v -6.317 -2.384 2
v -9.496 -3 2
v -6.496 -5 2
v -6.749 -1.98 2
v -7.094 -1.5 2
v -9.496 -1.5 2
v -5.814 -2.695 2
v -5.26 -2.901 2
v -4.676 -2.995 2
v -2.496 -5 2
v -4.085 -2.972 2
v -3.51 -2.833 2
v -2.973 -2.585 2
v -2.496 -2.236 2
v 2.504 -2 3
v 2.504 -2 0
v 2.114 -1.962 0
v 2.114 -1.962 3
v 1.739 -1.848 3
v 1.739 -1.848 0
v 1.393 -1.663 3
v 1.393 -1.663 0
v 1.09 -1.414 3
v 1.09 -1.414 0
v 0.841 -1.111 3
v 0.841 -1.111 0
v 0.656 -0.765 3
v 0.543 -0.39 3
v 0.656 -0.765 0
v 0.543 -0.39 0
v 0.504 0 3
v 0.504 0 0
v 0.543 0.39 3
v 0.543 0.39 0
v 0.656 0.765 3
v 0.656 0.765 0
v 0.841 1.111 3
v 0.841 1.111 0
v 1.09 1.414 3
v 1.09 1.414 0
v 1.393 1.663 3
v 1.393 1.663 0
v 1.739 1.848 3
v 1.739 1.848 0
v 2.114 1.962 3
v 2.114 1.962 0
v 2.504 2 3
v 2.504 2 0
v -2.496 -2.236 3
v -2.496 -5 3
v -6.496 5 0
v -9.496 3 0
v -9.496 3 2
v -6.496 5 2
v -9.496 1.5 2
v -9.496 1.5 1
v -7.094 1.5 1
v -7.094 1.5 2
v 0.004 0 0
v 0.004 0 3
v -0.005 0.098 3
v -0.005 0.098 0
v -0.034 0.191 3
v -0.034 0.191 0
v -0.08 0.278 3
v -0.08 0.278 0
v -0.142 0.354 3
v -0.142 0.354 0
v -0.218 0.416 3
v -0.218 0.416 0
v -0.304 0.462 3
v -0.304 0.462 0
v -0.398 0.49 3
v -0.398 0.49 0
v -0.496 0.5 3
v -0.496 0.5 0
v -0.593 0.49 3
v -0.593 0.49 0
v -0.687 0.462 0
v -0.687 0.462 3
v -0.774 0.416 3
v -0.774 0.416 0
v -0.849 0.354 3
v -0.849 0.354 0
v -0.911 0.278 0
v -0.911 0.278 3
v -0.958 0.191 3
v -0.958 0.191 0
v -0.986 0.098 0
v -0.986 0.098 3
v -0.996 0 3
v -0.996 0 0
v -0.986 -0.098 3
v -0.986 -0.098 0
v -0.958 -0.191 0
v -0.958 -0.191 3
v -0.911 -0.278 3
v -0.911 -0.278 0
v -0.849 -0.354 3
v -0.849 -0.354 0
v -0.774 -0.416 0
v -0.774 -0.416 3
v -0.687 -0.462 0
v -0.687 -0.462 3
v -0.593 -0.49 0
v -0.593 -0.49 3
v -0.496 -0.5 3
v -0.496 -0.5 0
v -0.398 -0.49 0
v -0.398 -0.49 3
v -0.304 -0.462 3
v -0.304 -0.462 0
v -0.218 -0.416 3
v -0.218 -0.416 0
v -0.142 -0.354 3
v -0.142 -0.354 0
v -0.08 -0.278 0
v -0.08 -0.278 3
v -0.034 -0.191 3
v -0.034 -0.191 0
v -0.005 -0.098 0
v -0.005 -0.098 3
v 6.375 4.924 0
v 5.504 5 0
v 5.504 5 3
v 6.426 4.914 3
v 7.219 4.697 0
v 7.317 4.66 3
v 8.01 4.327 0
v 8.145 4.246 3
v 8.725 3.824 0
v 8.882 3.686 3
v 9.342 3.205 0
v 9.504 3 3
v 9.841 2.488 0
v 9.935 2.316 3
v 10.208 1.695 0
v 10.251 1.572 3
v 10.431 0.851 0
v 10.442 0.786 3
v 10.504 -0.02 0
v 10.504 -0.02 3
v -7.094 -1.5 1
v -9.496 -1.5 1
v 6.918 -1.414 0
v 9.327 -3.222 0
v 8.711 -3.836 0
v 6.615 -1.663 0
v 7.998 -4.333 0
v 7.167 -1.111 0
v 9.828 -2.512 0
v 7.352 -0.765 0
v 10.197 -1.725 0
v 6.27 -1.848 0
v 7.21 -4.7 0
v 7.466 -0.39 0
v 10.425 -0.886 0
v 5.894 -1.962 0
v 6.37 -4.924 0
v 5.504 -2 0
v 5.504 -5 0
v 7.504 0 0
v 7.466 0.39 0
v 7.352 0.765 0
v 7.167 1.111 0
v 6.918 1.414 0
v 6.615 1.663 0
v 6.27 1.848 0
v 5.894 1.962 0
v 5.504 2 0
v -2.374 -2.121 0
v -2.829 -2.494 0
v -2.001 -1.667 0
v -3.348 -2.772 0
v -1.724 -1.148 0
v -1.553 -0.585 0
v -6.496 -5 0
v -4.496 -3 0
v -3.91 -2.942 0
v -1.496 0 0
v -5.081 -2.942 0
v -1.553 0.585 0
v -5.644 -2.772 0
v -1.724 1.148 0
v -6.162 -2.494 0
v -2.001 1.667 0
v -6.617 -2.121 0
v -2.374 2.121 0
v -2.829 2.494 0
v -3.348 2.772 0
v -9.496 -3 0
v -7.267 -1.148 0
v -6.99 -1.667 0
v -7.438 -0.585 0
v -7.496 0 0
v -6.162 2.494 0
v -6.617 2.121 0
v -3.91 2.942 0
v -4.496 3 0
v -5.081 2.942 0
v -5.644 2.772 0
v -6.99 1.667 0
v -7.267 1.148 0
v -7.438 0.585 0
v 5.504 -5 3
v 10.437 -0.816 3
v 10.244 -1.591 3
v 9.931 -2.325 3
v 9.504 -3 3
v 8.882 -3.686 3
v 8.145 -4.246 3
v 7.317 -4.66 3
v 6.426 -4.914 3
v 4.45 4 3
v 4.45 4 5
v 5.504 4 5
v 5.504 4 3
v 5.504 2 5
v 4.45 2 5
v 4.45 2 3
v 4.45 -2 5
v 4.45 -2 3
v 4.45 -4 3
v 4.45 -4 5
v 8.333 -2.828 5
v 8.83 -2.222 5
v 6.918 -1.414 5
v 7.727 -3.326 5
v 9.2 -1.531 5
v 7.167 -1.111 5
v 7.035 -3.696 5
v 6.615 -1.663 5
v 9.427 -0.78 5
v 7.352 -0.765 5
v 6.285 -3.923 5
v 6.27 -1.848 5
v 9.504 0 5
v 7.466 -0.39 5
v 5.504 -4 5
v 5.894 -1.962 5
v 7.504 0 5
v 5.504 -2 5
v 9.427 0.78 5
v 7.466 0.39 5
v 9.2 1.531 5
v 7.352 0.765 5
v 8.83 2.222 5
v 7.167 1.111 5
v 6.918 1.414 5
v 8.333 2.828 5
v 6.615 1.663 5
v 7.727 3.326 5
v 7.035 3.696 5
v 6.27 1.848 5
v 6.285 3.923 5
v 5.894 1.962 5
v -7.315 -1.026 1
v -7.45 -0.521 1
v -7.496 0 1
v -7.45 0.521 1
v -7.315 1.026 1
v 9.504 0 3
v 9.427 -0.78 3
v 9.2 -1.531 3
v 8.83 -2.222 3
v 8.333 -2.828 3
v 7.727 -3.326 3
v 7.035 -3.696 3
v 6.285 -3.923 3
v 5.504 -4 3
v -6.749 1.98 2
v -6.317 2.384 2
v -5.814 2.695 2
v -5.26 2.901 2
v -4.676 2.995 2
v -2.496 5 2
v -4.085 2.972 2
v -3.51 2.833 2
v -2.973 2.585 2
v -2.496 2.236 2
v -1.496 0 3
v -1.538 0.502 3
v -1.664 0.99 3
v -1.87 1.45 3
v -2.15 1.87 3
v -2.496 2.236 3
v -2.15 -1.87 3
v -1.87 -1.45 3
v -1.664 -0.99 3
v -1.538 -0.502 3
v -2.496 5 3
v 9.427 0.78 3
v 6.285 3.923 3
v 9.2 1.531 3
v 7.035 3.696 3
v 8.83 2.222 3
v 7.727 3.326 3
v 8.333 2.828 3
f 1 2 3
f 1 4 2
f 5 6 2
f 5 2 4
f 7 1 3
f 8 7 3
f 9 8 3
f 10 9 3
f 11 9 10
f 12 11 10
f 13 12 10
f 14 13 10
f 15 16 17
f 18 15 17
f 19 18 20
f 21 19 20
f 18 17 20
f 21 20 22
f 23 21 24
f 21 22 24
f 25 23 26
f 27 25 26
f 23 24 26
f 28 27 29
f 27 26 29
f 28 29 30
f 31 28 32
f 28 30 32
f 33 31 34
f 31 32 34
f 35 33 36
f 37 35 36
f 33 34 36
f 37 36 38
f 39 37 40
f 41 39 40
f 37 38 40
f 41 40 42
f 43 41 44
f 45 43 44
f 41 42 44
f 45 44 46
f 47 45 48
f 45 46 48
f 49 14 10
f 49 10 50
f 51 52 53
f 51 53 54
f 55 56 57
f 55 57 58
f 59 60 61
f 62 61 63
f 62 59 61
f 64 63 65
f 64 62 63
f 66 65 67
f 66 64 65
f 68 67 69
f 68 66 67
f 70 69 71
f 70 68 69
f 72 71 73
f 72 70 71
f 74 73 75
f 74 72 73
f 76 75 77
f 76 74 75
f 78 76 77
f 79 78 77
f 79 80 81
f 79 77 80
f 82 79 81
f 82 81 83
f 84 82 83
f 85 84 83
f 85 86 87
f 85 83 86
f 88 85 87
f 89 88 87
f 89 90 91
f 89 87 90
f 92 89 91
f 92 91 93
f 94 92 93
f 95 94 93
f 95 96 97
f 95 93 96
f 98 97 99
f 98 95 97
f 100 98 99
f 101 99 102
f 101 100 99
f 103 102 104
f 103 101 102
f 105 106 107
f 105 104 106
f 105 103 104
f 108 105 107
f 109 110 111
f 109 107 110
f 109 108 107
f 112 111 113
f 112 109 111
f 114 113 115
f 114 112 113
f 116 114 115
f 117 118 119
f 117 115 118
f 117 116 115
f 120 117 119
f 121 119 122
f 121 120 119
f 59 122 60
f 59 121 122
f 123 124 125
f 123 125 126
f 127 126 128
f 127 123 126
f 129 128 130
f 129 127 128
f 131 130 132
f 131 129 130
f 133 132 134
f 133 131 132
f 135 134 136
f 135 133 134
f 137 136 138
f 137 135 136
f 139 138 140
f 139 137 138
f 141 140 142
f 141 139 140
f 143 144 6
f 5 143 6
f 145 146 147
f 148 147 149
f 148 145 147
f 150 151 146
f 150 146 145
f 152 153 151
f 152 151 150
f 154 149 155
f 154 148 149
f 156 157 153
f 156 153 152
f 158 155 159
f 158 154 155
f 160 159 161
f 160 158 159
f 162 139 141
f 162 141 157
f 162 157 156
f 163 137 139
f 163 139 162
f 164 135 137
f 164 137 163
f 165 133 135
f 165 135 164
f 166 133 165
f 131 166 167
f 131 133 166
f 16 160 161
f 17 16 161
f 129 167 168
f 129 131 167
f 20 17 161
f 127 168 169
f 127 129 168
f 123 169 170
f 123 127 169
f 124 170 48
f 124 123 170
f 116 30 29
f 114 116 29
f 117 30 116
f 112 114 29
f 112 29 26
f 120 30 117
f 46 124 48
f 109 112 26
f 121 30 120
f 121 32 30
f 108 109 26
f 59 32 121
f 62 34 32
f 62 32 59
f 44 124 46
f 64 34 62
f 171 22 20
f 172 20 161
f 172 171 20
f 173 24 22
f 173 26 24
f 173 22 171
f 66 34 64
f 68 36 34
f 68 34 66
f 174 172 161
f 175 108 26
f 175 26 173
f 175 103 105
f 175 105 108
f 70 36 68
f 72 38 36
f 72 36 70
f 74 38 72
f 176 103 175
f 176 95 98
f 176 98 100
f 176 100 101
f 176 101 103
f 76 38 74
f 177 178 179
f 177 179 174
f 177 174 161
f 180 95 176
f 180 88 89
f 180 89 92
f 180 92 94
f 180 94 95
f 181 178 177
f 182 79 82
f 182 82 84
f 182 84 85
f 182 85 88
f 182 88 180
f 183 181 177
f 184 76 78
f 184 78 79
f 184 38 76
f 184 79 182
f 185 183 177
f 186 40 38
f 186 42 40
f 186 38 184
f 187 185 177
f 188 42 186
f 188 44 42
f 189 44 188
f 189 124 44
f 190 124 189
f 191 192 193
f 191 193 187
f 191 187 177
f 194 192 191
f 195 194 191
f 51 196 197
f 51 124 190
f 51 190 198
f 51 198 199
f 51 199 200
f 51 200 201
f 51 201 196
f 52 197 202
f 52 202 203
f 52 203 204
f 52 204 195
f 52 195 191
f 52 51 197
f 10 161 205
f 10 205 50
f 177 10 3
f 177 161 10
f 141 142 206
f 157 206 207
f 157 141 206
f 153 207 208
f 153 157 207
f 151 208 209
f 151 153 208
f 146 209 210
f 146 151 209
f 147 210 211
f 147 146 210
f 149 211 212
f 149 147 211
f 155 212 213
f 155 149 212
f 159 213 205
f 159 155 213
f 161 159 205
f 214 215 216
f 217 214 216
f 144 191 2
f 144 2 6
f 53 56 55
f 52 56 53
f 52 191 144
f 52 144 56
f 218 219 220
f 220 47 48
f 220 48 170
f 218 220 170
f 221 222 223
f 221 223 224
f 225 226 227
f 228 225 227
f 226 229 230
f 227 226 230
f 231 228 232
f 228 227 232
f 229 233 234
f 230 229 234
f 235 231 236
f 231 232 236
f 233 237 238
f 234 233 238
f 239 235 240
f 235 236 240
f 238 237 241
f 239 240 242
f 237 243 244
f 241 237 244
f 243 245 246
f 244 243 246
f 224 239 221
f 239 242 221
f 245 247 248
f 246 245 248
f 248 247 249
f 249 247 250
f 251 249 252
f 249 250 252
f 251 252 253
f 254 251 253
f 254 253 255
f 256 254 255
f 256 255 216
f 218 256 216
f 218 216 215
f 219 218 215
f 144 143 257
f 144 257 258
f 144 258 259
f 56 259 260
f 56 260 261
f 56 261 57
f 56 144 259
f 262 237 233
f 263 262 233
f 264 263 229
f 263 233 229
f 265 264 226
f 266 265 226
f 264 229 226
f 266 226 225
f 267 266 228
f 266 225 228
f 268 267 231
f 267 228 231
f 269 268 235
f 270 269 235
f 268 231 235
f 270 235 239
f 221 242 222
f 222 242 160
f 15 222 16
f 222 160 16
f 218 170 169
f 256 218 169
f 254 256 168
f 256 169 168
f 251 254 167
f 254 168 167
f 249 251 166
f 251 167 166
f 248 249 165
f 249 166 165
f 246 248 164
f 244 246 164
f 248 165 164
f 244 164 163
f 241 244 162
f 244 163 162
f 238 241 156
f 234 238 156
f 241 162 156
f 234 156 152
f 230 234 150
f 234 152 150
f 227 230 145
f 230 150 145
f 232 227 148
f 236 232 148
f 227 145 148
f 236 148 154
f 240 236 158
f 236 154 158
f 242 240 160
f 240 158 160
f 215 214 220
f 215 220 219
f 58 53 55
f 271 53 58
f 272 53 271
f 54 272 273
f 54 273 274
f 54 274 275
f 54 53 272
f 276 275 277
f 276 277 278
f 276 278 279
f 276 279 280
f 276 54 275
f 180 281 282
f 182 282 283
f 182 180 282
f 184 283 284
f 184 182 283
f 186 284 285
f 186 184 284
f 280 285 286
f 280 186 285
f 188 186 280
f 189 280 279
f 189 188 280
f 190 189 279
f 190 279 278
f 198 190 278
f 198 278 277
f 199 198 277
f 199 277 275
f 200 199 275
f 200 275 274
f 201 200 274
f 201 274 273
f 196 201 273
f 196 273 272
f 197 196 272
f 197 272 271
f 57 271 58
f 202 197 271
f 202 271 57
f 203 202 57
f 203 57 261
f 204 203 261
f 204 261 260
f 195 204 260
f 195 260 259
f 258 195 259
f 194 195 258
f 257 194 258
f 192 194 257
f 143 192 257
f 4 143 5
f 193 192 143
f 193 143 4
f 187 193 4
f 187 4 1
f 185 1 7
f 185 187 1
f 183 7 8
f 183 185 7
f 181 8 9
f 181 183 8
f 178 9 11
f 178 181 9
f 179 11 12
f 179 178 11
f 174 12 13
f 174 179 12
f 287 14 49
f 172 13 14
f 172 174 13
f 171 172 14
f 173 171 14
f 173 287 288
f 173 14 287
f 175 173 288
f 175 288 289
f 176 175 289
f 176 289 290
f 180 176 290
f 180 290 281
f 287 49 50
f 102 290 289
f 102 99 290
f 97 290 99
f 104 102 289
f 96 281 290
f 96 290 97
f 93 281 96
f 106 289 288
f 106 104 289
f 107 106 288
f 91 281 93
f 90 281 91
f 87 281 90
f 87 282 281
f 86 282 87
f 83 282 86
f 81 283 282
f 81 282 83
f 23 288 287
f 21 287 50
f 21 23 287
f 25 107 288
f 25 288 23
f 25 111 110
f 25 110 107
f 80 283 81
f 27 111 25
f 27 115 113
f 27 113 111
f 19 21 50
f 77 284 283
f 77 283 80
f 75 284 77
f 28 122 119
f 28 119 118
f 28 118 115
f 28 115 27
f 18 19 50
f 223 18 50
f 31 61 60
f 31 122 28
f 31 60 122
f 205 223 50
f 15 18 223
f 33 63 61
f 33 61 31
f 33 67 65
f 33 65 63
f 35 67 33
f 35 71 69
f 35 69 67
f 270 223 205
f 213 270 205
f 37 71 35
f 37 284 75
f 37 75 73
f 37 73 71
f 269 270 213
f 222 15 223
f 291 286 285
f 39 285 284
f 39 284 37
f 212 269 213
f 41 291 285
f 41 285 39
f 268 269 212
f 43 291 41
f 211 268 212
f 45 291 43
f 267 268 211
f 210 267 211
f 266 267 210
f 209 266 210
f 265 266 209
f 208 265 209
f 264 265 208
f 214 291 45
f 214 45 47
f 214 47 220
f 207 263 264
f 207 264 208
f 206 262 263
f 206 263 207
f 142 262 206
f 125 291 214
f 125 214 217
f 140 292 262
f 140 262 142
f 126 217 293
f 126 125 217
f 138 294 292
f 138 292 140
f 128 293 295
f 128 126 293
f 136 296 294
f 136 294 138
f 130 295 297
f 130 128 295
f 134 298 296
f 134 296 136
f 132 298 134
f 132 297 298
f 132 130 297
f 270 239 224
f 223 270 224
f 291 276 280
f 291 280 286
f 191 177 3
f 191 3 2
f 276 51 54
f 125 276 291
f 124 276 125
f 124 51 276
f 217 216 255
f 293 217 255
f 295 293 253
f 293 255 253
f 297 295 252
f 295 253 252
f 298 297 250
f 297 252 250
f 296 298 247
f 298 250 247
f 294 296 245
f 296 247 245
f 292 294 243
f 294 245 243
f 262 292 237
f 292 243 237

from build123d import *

# Parameters (mm, degrees)
SKETCH1_R           = 3
SKETCH1_R_2         = 0.5
BOSS_EXTRUDE1_DEPTH = 5
CUT_EXTRUDE1_DEPTH  = 25
CUT_EXTRUDE2_DEPTH  = 2
SKETCH4_W           = 1
SKETCH4_H           = 3
CUT_EXTRUDE3_DEPTH  = 3


with BuildPart() as part:
    # Sketch1 → Boss-Extrude1 (new body)
    with BuildSketch(Plane.XY):
        with BuildLine():
            Line((-9.495764101, 3), (-6.495764101, 5))
            Line((-6.495764101, 5), (5.504235899, 5))
            ThreePointArc((5.504235899, 5), (9.046847958, 3.528441554), (10.504195739, -0.02004008))
            ThreePointArc((10.504195739, -0.02004008), (9.032677453, -3.542612059), (5.504235899, -5))
            Line((5.504235899, -5), (-6.495764101, -5))
            Line((-6.495764101, -5), (-9.495764101, -3))
            Line((-9.495764101, -3), (-9.495764101, 3))
        make_face()
        with Locations((-4.495764101, 0)):
            Circle(SKETCH1_R, mode=Mode.SUBTRACT)
        with Locations((-0.495764101, 0)):
            Circle(SKETCH1_R_2, mode=Mode.SUBTRACT)
        with BuildLine():
            Line((2.504235899, 2), (5.504235899, 2))
            ThreePointArc((5.504235899, 2), (7.504235899, 0), (5.504235899, -2))
            Line((5.504235899, -2), (2.504235899, -2))
            ThreePointArc((2.504235899, -2), (0.504235899, 0), (2.504235899, 2))
        make_face(mode=Mode.SUBTRACT)
    extrude(amount=BOSS_EXTRUDE1_DEPTH)

    # Sketch2 → Cut-Extrude1 (cut)
    with BuildSketch(Plane(origin=(0, 5, 0), x_dir=(1, 0, 0), z_dir=(0, 1, 0))):
        Polygon((-9.495764101, -2), (-2.495764101, -2), (-2.495764101, -3), (4.450061274, -3), (4.450061274, -5), (9.504235899, -5), (9.504235899, -3), (10.504235899, -3), (10.504235899, -6.643116644), (-9.495764101, -6.643116644), align=None)
    extrude(amount=-CUT_EXTRUDE1_DEPTH, mode=Mode.SUBTRACT)

    # Sketch3 → Cut-Extrude2 (cut)
    with BuildSketch(Plane.XY.offset(5)):
        with BuildLine():
            Line((4.450061274, 5), (4.450061274, 4))
            Line((4.450061274, 4), (5.504235899, 4))
            ThreePointArc((5.504235899, 4), (8.332663024, 2.828427125), (9.504235899, 0))
            Line((9.504235899, 0), (9.504235899, 3))
            ThreePointArc((9.504235899, 3), (7.740303877, 4.472135955), (5.504235899, 5))
            Line((5.504235899, 5), (4.450061274, 5))
        make_face()
        with BuildLine():
            Line((5.504235899, -4), (4.450061274, -4))
            Line((4.450061274, -4), (4.450061274, -5))
            Line((4.450061274, -5), (5.504235899, -5))
            ThreePointArc((5.504235899, -5), (7.740303877, -4.472135955), (9.504235899, -3))
            Line((9.504235899, -3), (9.504235899, 0))
            ThreePointArc((9.504235899, 0), (8.332663024, -2.828427125), (5.504235899, -4))
        make_face()
        with BuildLine():
            Line((4.450061274, -4), (4.450061274, -2))
            Line((4.450061274, -2), (2.504235899, -2))
            ThreePointArc((2.504235899, -2), (0.504235899, 0), (2.504235899, 2))
            Line((2.504235899, 2), (4.450061274, 2))
            Line((4.450061274, 2), (4.450061274, 4))
            Line((4.450061274, 4), (4.429293772, 4))
            Line((4.429293772, 4), (2.504235899, 4))
            ThreePointArc((2.504235899, 4), (-1.495764101, 0), (2.504235899, -4))
            Line((2.504235899, -4), (4.450061274, -4))
        make_face()
    extrude(amount=-CUT_EXTRUDE2_DEPTH, mode=Mode.SUBTRACT)

    # Sketch4 → Cut-Extrude3 (cut)
    with BuildSketch(Plane.ZY.offset(9.495764101)):
        with Locations((1.5, 0)):
            Rectangle(SKETCH4_W, SKETCH4_H)
    extrude(amount=-CUT_EXTRUDE3_DEPTH, mode=Mode.SUBTRACT)


solid = part.part
